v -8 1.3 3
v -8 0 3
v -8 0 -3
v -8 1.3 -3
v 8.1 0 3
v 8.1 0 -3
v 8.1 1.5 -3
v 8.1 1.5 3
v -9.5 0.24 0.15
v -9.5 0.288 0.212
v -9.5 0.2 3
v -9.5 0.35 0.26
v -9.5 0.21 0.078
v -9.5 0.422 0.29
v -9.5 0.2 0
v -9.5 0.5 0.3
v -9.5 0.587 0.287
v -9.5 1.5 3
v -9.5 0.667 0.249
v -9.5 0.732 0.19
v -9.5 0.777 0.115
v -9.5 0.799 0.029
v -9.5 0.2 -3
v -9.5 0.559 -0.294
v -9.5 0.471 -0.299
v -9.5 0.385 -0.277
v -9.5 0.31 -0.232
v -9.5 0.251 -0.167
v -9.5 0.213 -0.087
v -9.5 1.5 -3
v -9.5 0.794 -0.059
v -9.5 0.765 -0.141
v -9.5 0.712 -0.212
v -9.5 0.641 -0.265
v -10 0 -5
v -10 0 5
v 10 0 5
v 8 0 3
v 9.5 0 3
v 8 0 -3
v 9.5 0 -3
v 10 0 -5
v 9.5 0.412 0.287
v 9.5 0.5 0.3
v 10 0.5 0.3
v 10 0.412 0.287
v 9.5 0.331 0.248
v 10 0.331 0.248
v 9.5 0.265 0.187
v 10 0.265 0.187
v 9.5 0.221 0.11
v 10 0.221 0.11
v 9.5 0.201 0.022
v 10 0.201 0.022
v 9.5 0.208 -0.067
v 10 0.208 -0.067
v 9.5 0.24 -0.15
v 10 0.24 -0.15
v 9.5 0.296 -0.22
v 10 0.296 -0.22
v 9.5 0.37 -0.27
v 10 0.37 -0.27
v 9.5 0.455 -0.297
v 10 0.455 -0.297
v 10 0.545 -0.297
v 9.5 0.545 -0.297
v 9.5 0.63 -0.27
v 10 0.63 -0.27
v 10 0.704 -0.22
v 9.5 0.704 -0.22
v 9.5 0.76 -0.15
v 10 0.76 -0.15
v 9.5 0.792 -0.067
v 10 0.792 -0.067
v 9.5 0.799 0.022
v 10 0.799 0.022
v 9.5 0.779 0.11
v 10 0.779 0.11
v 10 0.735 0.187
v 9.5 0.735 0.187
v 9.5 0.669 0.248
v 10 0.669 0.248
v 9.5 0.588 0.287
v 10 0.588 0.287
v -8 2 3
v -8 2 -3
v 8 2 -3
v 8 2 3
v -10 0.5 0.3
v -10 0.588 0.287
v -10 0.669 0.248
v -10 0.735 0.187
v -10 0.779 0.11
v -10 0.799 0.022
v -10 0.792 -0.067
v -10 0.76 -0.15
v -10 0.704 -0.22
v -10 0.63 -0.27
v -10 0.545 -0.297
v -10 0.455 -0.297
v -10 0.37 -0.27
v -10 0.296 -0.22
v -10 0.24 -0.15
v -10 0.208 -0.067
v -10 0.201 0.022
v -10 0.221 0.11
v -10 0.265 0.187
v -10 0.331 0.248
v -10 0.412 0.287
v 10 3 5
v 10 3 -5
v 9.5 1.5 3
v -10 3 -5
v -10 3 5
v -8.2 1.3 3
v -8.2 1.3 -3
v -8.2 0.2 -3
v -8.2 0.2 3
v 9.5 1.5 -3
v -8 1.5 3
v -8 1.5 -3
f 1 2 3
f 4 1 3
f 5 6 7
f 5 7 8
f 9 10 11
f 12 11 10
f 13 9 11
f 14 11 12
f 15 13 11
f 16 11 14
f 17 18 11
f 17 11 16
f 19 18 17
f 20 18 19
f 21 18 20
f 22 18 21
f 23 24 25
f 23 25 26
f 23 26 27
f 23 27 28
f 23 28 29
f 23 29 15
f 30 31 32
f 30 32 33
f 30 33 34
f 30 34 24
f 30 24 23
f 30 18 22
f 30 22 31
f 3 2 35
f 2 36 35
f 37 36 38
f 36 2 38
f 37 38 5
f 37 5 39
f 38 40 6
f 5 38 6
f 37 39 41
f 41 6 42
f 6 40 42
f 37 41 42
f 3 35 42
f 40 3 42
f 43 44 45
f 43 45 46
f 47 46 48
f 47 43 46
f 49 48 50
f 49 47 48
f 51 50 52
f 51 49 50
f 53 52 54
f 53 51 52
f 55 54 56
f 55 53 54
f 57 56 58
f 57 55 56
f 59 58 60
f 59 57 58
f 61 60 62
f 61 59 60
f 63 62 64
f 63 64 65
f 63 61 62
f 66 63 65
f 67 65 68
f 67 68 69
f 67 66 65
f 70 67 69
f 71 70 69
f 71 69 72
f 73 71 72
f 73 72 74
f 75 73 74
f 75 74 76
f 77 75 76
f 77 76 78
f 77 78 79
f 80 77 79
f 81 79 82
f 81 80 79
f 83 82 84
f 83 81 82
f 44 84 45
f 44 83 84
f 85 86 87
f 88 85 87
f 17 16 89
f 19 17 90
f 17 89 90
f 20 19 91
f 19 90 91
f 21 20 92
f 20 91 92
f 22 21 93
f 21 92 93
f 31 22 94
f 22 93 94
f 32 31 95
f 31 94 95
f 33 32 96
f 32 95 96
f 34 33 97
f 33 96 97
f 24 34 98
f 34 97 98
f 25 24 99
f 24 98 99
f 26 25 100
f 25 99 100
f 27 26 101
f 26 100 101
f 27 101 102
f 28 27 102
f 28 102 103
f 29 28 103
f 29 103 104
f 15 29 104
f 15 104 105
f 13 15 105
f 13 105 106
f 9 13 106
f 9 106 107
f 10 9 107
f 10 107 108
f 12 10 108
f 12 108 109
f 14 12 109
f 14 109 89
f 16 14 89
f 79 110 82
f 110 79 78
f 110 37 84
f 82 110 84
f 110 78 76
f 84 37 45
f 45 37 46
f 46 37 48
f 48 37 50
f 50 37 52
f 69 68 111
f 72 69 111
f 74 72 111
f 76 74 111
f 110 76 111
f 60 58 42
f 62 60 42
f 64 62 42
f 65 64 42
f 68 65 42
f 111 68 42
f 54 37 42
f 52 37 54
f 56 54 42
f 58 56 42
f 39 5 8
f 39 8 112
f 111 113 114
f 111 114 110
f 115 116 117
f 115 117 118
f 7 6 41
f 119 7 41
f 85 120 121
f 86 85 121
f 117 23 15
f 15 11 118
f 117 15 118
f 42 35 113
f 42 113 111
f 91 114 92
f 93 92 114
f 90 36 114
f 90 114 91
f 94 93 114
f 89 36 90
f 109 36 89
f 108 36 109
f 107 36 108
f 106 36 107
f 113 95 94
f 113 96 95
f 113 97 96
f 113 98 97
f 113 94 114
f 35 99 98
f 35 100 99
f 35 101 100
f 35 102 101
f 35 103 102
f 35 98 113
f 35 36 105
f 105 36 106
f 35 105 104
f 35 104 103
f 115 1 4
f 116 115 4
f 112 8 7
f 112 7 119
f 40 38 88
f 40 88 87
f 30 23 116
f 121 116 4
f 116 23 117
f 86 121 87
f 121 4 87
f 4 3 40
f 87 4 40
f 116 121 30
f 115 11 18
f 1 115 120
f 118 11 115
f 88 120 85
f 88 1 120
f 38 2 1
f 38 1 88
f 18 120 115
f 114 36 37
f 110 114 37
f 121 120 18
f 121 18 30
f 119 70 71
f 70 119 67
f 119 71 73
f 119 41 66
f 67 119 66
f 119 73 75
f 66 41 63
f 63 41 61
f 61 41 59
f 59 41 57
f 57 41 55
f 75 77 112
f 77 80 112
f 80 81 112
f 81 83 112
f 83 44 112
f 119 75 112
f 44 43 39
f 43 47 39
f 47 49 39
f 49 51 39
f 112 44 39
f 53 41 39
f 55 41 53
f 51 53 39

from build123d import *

# Parameters (mm, degrees)
SKETCH_1_W           = 20
SKETCH_1_H           = 10
EXTRUDE_1_DEPTH      = 3
SKETCH_2_W           = 16
SKETCH_2_H           = 6
CUT_EXTRUDE_1_DEPTH  = 2
SKETCH_3_W           = 6
SKETCH_3_H           = 0.2
CUT_EXTRUDE_2_DEPTH  = 1.5
SKETCH_5_W           = 1.3
SKETCH_5_H           = 6
CUT_EXTRUDE_4_DEPTH  = 1.3
SKETCH_11_R          = 0.3
CUT_EXTRUDE_7_DEPTH  = 0.5
SKETCH_14_W          = 1.4
SKETCH_14_H          = 6
CUT_EXTRUDE_9_DEPTH  = 1.5
CUT_EXTRUDE_START    = -0.5
SKETCH_15_R          = 0.3
CUT_EXTRUDE_10_DEPTH = 0.5


with BuildPart() as part:
    # 草图1 → 凸台-拉伸1 (new body)
    with BuildSketch(Plane(origin=(0, 0, 0), x_dir=(1, 0, 0), z_dir=(0, 1, 0))):
        Rectangle(SKETCH_1_W, SKETCH_1_H)
    extrude(amount=EXTRUDE_1_DEPTH)

    # 草图2 → 切除-拉伸1 (cut)
    with BuildSketch(Plane(origin=(0, 0, 0), x_dir=(1, 0, 0), z_dir=(0, 1, 0))):
        Rectangle(SKETCH_2_W, SKETCH_2_H)
    extrude(amount=CUT_EXTRUDE_1_DEPTH, mode=Mode.SUBTRACT)

    # 草图3 → 切除-拉伸2 (cut)
    with BuildSketch(Plane(origin=(-8, 0, 0), x_dir=(0, 0, -1), z_dir=(1, 0, 0))):
        with Locations((0, 1.4)):
            Rectangle(SKETCH_3_W, SKETCH_3_H)
    extrude(amount=-CUT_EXTRUDE_2_DEPTH, mode=Mode.SUBTRACT)

    # 草图5 → 切除-拉伸4 (cut)
    with BuildSketch(Plane.XZ.offset(-1.5)):
        with Locations((-8.85, 0)):
            Rectangle(SKETCH_5_W, SKETCH_5_H)
    extrude(amount=CUT_EXTRUDE_4_DEPTH, mode=Mode.SUBTRACT)

    # 草图11 → 切除-拉伸7 (cut)
    with BuildSketch(Plane.ZY.offset(10)):
        with Locations((0, 0.5)):
            Circle(SKETCH_11_R)
    extrude(amount=-CUT_EXTRUDE_7_DEPTH, mode=Mode.SUBTRACT)

    # 草图14 → 切除-拉伸9 (cut)
    with BuildSketch(Plane.XZ):
        with Locations((8.8, 0)):
            Rectangle(SKETCH_14_W, SKETCH_14_H)
    extrude(amount=-CUT_EXTRUDE_9_DEPTH, mode=Mode.SUBTRACT)

    # 草图15 → 切除-拉伸10 (cut)
    with BuildSketch(Plane(origin=(10, 0, 0), x_dir=(0, 0, -1), z_dir=(1, 0, 0)).offset(CUT_EXTRUDE_START)):
        with Locations(Location((0, 0.5, 0), (0, 0, 180))):
            Circle(SKETCH_15_R)
    extrude(amount=CUT_EXTRUDE_10_DEPTH, mode=Mode.SUBTRACT)


solid = part.part
